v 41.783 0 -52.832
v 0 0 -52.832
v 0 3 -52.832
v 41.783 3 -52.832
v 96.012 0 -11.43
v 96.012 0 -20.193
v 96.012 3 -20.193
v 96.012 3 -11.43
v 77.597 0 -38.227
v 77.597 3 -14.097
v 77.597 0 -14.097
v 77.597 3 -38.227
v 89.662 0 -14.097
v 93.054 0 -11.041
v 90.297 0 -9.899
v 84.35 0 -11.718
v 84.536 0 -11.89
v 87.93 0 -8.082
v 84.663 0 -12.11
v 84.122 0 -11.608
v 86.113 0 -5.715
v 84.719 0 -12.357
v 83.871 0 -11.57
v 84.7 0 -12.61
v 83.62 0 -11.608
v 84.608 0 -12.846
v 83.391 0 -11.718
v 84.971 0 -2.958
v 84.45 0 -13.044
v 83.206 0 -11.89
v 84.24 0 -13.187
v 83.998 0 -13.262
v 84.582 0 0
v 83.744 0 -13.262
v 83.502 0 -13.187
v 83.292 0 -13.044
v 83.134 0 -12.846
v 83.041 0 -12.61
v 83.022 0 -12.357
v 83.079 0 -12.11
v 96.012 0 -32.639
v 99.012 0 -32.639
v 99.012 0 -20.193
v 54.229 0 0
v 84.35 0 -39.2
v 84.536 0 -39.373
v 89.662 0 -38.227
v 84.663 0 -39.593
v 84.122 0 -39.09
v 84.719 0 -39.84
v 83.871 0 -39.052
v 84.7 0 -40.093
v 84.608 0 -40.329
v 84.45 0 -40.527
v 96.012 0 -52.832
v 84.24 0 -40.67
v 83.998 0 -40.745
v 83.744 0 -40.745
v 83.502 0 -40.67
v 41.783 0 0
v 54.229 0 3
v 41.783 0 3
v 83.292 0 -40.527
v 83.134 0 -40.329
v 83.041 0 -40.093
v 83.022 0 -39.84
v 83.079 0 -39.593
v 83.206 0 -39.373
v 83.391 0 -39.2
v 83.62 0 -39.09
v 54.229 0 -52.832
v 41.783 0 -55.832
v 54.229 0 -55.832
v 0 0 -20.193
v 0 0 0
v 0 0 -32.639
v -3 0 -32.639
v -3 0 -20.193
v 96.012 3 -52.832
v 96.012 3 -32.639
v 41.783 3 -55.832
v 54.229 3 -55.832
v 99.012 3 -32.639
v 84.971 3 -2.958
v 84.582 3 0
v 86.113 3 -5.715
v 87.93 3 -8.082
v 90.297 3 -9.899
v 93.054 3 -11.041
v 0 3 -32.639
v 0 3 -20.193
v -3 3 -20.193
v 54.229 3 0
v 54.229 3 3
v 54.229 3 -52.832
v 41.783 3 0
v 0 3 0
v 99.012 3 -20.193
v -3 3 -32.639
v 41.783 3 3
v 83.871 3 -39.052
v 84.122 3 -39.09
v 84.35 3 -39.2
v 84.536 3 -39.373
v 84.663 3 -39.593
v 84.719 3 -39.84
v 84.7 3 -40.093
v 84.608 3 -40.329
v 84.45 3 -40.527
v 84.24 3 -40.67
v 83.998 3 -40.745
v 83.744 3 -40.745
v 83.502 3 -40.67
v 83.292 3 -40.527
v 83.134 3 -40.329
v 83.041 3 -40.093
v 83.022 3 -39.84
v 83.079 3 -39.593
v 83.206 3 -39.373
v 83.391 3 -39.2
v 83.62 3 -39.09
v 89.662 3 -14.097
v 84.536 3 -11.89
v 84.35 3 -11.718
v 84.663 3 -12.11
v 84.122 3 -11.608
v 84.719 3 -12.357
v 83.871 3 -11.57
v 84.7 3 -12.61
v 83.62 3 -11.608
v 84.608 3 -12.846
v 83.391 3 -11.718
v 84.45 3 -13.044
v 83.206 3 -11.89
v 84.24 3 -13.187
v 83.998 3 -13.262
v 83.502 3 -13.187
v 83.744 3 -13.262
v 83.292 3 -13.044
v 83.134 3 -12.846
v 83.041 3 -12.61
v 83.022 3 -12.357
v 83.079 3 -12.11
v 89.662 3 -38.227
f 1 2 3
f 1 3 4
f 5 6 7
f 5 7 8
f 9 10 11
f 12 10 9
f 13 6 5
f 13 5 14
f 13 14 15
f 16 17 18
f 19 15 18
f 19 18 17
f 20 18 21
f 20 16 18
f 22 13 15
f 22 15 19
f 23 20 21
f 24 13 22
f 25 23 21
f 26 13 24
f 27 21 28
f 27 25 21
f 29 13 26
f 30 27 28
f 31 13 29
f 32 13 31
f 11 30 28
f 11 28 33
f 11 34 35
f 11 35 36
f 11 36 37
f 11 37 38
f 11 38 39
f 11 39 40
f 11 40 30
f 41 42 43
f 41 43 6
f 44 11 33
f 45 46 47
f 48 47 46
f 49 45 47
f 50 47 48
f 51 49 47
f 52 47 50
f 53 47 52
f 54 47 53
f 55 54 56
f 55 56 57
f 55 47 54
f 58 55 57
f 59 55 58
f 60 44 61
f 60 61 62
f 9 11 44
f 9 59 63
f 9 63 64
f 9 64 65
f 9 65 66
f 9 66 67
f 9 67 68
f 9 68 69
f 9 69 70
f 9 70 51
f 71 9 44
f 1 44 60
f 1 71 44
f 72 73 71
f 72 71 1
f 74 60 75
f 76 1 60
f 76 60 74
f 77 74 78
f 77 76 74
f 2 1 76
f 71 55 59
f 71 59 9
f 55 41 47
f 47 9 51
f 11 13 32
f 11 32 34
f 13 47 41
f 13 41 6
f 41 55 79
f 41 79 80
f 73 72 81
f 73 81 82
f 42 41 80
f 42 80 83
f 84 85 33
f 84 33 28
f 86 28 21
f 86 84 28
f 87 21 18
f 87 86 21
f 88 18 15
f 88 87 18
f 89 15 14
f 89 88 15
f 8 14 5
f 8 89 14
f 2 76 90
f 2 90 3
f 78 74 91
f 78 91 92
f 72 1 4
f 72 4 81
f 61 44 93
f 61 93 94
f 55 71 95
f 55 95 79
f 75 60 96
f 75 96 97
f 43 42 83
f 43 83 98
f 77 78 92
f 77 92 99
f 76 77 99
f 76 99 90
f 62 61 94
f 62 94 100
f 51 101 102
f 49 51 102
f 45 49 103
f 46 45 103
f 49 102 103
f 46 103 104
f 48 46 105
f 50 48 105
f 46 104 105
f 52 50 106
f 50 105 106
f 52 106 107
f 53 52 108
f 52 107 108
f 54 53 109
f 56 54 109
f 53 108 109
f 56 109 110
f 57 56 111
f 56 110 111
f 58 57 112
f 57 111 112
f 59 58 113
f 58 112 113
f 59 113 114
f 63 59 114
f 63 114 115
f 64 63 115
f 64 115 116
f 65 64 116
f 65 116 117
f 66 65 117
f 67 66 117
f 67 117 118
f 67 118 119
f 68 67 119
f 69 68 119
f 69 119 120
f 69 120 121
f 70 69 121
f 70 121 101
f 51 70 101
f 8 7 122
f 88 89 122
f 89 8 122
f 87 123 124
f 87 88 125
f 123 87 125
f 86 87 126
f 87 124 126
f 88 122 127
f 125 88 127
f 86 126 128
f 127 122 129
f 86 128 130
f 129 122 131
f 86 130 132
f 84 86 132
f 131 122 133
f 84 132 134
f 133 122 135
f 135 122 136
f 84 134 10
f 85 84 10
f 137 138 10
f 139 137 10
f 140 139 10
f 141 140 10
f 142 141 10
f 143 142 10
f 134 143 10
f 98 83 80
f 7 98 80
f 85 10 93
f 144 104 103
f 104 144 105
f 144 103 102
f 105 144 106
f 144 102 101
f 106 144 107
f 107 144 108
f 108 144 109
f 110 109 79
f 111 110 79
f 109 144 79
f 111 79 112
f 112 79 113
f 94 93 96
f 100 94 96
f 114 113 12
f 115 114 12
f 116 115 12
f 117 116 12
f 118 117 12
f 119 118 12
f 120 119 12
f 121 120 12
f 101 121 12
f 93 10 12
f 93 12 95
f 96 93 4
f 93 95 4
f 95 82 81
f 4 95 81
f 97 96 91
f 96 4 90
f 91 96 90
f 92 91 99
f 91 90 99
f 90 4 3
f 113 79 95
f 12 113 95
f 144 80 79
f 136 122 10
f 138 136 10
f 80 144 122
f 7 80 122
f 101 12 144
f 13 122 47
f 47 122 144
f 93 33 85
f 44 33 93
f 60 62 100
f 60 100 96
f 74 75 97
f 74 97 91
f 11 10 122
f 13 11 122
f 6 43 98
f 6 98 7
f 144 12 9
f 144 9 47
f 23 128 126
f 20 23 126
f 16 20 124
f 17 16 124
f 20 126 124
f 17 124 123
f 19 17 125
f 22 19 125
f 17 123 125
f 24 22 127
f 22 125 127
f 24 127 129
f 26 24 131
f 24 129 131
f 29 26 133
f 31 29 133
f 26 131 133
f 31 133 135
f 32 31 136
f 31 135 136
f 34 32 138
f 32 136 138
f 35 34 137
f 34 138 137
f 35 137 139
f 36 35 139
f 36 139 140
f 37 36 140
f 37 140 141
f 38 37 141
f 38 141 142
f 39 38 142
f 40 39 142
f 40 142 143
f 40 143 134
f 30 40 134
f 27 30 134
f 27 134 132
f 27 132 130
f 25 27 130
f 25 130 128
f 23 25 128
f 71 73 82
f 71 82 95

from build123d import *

# Parameters (mm, degrees)
BOSS_EXTRUDE1_DEPTH = 3
SKETCH3_W           = 12.065
SKETCH3_H           = 24.13
CUT_EXTRUDE1_DEPTH  = 114.708347838
CUT_EXTRUDE3_DEPTH  = 114.708347838
SKETCH5_R           = 0.8509
CUT_EXTRUDE4_DEPTH  = 114.708347838


with BuildPart() as part:
    # Sketch1 → Boss-Extrude1 (new body)
    with BuildSketch(Plane(origin=(0, 0, 0), x_dir=(1, 0, 0), z_dir=(0, 1, 0))):
        Polygon((0, 0), (0, 20.193), (-3, 20.193), (-3, 32.639), (0, 32.639), (0, 52.832), (41.783, 52.832), (41.783, 55.832), (54.229, 55.832), (54.229, 52.832), (96.012, 52.832), (96.012, 32.639), (99.012, 32.639), (99.012, 20.193), (96.012, 20.193), (96.012, 0), (54.229, 0), (54.229, -3), (41.783, -3), (41.783, 0), align=None)
    extrude(amount=BOSS_EXTRUDE1_DEPTH)

    # Sketch3 → Cut-Extrude1 (cut, through all)
    with BuildSketch(Plane(origin=(0, 3, 0), x_dir=(1, 0, 0), z_dir=(0, 1, 0))):
        with Locations((83.6295, 26.162)):
            Rectangle(SKETCH3_W, SKETCH3_H)
    extrude(amount=-CUT_EXTRUDE1_DEPTH, mode=Mode.SUBTRACT)

    # Sketch4 → Cut-Extrude3 (cut, through all)
    with BuildSketch(Plane(origin=(0, 3, 0), x_dir=(1, 0, 0), z_dir=(0, 1, 0))):
        with BuildLine():
            Line((96.012, 11.43), (96.012, 0))
            Line((96.012, 0), (84.582, 0))
            ThreePointArc((84.582, 0), (87.929769491, 8.082230509), (96.012, 11.43))
        make_face()
    extrude(amount=-CUT_EXTRUDE3_DEPTH, mode=Mode.SUBTRACT)

    # Sketch5 → Cut-Extrude4 (cut, through all)
    with BuildSketch(Plane(origin=(0, 3, 0), x_dir=(1, 0, 0), z_dir=(0, 1, 0))):
        with Locations(Location((83.8708, 39.9034, 0), (0, 0, 270))):
            Circle(SKETCH5_R)
        with Locations(Location((83.8708, 12.4206, 0), (0, 0, 270))):
            Circle(SKETCH5_R)
    extrude(amount=-CUT_EXTRUDE4_DEPTH, mode=Mode.SUBTRACT)


solid = part.part
